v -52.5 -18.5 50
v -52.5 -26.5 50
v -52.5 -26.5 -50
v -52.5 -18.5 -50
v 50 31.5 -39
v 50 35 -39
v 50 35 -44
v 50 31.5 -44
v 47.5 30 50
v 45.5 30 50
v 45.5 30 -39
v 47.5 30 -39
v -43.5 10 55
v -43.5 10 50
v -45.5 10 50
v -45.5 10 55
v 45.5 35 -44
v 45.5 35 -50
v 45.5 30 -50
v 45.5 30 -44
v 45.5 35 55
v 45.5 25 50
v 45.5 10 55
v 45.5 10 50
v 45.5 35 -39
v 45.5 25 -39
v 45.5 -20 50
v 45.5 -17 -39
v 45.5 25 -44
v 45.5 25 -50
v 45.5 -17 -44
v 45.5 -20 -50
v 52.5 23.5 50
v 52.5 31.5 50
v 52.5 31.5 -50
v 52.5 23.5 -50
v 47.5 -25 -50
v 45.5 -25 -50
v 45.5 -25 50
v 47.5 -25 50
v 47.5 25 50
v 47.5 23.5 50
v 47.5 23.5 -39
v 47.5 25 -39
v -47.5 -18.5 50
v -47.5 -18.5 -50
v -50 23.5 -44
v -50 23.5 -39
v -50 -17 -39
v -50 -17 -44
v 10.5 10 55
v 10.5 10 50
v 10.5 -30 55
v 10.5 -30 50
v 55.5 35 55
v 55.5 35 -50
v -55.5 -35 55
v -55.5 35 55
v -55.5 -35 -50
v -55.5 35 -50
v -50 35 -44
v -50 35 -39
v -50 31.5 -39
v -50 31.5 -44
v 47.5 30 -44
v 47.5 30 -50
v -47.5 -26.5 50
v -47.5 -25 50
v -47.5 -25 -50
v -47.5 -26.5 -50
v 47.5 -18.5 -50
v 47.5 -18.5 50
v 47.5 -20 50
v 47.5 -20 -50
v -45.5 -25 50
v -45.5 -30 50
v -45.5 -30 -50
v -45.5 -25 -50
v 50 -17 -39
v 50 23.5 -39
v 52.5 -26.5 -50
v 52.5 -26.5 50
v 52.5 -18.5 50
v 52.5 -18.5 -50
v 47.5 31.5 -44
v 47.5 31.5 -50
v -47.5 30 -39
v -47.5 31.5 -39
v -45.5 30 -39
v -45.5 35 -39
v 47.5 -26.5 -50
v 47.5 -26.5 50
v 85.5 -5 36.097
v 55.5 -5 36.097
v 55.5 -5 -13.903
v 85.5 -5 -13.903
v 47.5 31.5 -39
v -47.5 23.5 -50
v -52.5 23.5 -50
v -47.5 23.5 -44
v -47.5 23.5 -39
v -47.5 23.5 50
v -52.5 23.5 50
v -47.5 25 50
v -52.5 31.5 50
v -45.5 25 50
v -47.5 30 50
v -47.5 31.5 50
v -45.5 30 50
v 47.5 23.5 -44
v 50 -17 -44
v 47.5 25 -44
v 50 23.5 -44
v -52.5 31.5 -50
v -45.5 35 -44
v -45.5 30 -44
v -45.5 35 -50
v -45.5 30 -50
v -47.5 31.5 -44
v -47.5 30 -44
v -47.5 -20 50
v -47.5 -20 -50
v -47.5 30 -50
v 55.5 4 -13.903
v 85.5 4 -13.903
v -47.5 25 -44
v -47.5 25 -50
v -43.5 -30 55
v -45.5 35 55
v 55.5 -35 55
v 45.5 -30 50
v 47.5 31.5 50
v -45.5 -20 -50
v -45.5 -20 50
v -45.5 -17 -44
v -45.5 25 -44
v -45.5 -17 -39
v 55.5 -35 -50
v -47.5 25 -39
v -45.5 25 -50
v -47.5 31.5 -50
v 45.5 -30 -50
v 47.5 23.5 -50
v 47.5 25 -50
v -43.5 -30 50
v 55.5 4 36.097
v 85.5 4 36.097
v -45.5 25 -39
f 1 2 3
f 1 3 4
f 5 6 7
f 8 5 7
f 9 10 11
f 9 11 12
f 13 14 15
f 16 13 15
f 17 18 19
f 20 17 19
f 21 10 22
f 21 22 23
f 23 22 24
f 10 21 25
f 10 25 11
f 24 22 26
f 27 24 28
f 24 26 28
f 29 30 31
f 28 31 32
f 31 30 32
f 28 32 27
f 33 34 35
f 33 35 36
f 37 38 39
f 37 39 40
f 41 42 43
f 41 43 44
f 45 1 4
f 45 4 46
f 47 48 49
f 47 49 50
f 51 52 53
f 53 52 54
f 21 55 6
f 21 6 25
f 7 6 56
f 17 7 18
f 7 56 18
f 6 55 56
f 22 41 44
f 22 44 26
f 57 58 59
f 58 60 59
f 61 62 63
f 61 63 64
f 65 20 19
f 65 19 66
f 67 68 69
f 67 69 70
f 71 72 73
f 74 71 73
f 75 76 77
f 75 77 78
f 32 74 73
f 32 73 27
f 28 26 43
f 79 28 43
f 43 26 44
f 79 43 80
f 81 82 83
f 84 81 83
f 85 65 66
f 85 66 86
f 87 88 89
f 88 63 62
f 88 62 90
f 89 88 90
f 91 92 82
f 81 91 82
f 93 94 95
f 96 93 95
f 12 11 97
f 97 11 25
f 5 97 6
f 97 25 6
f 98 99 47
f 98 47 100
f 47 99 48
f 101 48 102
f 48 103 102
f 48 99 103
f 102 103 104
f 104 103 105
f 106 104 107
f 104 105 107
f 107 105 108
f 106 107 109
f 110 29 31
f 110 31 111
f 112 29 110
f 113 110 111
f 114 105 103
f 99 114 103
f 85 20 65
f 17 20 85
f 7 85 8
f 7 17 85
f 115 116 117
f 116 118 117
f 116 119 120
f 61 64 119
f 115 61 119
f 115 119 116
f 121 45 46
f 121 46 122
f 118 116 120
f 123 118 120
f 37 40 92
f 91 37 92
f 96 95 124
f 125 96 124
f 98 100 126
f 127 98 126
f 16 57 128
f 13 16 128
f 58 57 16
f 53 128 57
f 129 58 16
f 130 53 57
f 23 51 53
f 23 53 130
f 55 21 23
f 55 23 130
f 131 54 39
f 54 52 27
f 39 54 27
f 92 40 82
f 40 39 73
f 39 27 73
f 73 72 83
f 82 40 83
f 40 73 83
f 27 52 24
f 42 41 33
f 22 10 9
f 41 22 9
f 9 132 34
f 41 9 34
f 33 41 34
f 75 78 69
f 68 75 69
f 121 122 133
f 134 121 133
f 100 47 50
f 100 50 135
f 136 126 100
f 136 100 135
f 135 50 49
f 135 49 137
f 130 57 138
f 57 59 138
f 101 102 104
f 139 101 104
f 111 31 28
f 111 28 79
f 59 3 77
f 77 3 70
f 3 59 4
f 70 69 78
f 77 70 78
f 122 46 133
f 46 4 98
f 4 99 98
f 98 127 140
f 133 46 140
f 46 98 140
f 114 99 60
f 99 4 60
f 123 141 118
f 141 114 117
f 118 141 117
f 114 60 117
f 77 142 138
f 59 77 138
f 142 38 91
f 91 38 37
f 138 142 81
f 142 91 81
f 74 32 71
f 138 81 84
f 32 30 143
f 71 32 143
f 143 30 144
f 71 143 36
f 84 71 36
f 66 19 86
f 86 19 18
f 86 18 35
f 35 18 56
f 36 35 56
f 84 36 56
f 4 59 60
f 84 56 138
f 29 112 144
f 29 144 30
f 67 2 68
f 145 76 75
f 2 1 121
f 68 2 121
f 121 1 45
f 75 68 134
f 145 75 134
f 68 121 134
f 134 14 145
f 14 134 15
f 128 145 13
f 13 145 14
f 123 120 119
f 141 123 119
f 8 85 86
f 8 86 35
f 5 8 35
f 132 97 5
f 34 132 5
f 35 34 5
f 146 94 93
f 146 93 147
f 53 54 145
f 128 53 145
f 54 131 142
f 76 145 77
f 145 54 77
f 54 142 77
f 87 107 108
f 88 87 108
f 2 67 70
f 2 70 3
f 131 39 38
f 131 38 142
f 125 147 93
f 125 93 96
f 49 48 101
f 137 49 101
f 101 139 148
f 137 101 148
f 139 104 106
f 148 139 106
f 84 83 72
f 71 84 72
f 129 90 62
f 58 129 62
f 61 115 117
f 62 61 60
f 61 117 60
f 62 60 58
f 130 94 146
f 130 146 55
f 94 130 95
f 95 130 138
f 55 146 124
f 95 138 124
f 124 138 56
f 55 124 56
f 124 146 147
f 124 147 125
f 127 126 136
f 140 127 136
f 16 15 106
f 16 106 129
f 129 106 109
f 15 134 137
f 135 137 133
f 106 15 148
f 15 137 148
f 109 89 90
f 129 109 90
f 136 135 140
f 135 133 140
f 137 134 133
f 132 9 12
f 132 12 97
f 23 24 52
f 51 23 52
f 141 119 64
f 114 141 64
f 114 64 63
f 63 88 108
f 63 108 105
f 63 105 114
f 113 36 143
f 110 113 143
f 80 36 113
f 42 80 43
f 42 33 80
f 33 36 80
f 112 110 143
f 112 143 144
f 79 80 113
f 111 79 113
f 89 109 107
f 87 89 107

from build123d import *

# Parameters (mm, degrees)
BOSS_EXTRUDE1_DEPTH = 50
CUT_EXTRUDE3_DEPTH  = 120.604556769
BOSS_EXTRUDE2_DEPTH = 5
CUT_EXTRUDE4_START  = 35
SKETCH4_W           = 100
SKETCH4_H           = 5
CUT_EXTRUDE4_DEPTH  = 52
SKETCH5_W           = 50
SKETCH5_H           = 9
BOSS_EXTRUDE3_DEPTH = 30


with BuildPart() as part:
    # Sketch1 → Boss-Extrude1 (new, symmetric)
    with BuildSketch(Plane.XY):
        Polygon((-45.5, 30), (-45.5, 35), (-55.5, 35), (-55.5, -35), (55.5, -35), (55.5, 35), (45.5, 35), (45.5, 30), (45.5, -30), (-45.5, -30), align=None)
    extrude(amount=BOSS_EXTRUDE1_DEPTH, both=True)

    # Sketch2 → Cut-Extrude3 (cut, through all)
    with BuildSketch(Plane.XY.offset(50)):
        Polygon((-47.5, 25), (-45.5, 25), (-45.5, 30), (-47.5, 30), (-47.5, 31.5), (-52.5, 31.5), (-52.5, 23.5), (-47.5, 23.5), align=None)
        Polygon((47.5, 23.5), (47.5, 25), (45.5, 25), (45.5, 30), (47.5, 30), (47.5, 31.5), (52.5, 31.5), (52.5, 23.5), align=None)
        Polygon((47.5, -20), (45.5, -20), (45.5, -25), (47.5, -25), (47.5, -26.5), (52.5, -26.5), (52.5, -18.5), (47.5, -18.5), align=None)
        Polygon((-47.5, -18.5), (-47.5, -20), (-45.5, -20), (-45.5, -25), (-47.5, -25), (-47.5, -26.5), (-52.5, -26.5), (-52.5, -18.5), align=None)
    extrude(amount=-CUT_EXTRUDE3_DEPTH, mode=Mode.SUBTRACT)

    # Sketch3 → Boss-Extrude2 (add)
    with BuildSketch(Plane.XY.offset(50)):
        Polygon((10.5, 10), (10.5, -30), (45.5, -30), (45.5, -25), (45.5, -20), (45.5, 10), align=None)
        Polygon((-45.5, 35), (-55.5, 35), (-55.5, -35), (55.5, -35), (55.5, 35), (45.5, 35), (45.5, 30), (47.5, 30), (47.5, 31.5), (52.5, 31.5), (52.5, 23.5), (47.5, 23.5), (47.5, 25), (45.5, 25), (45.5, 10), (45.5, -20), (47.5, -20), (47.5, -18.5), (52.5, -18.5), (52.5, -26.5), (47.5, -26.5), (47.5, -25), (45.5, -25), (45.5, -30), (10.5, -30), (-43.5, -30), (-45.5, -30), (-45.5, -25), (-47.5, -25), (-47.5, -26.5), (-52.5, -26.5), (-52.5, -18.5), (-47.5, -18.5), (-47.5, -20), (-45.5, -20), (-45.5, 10), (-45.5, 25), (-47.5, 25), (-47.5, 23.5), (-52.5, 23.5), (-52.5, 31.5), (-47.5, 31.5), (-47.5, 30), (-45.5, 30), align=None)
        Polygon((-43.5, 10), (-45.5, 10), (-45.5, -20), (-45.5, -25), (-45.5, -30), (-43.5, -30), align=None)
        Polygon((47.5, -20), (45.5, -20), (45.5, -25), (47.5, -25), (47.5, -26.5), (52.5, -26.5), (52.5, -18.5), (47.5, -18.5), align=None)
        Polygon((47.5, 30), (45.5, 30), (45.5, 25), (47.5, 25), (47.5, 23.5), (52.5, 23.5), (52.5, 31.5), (47.5, 31.5), align=None)
        Polygon((-45.5, -25), (-45.5, -20), (-47.5, -20), (-47.5, -18.5), (-52.5, -18.5), (-52.5, -26.5), (-47.5, -26.5), (-47.5, -25), align=None)
        Polygon((-45.5, 25), (-45.5, 30), (-47.5, 30), (-47.5, 31.5), (-52.5, 31.5), (-52.5, 23.5), (-47.5, 23.5), (-47.5, 25), align=None)
    extrude(amount=BOSS_EXTRUDE2_DEPTH)

    # Sketch4 → Cut-Extrude4 (cut)
    with BuildSketch(Plane(origin=(0, 0, 0), x_dir=(1, 0, 0), z_dir=(0, 1, 0)).offset(CUT_EXTRUDE4_START)):
        with Locations((0, 41.5)):
            Rectangle(SKETCH4_W, SKETCH4_H)
    extrude(amount=-CUT_EXTRUDE4_DEPTH, mode=Mode.SUBTRACT)

    # Sketch5 → Boss-Extrude3 (add)
    with BuildSketch(Plane(origin=(55.5, 0, 0), x_dir=(0, 0, -1), z_dir=(1, 0, 0))):
        with Locations((-11.097410489, -0.5)):
            Rectangle(SKETCH5_W, SKETCH5_H)
    extrude(amount=BOSS_EXTRUDE3_DEPTH)


solid = part.part
